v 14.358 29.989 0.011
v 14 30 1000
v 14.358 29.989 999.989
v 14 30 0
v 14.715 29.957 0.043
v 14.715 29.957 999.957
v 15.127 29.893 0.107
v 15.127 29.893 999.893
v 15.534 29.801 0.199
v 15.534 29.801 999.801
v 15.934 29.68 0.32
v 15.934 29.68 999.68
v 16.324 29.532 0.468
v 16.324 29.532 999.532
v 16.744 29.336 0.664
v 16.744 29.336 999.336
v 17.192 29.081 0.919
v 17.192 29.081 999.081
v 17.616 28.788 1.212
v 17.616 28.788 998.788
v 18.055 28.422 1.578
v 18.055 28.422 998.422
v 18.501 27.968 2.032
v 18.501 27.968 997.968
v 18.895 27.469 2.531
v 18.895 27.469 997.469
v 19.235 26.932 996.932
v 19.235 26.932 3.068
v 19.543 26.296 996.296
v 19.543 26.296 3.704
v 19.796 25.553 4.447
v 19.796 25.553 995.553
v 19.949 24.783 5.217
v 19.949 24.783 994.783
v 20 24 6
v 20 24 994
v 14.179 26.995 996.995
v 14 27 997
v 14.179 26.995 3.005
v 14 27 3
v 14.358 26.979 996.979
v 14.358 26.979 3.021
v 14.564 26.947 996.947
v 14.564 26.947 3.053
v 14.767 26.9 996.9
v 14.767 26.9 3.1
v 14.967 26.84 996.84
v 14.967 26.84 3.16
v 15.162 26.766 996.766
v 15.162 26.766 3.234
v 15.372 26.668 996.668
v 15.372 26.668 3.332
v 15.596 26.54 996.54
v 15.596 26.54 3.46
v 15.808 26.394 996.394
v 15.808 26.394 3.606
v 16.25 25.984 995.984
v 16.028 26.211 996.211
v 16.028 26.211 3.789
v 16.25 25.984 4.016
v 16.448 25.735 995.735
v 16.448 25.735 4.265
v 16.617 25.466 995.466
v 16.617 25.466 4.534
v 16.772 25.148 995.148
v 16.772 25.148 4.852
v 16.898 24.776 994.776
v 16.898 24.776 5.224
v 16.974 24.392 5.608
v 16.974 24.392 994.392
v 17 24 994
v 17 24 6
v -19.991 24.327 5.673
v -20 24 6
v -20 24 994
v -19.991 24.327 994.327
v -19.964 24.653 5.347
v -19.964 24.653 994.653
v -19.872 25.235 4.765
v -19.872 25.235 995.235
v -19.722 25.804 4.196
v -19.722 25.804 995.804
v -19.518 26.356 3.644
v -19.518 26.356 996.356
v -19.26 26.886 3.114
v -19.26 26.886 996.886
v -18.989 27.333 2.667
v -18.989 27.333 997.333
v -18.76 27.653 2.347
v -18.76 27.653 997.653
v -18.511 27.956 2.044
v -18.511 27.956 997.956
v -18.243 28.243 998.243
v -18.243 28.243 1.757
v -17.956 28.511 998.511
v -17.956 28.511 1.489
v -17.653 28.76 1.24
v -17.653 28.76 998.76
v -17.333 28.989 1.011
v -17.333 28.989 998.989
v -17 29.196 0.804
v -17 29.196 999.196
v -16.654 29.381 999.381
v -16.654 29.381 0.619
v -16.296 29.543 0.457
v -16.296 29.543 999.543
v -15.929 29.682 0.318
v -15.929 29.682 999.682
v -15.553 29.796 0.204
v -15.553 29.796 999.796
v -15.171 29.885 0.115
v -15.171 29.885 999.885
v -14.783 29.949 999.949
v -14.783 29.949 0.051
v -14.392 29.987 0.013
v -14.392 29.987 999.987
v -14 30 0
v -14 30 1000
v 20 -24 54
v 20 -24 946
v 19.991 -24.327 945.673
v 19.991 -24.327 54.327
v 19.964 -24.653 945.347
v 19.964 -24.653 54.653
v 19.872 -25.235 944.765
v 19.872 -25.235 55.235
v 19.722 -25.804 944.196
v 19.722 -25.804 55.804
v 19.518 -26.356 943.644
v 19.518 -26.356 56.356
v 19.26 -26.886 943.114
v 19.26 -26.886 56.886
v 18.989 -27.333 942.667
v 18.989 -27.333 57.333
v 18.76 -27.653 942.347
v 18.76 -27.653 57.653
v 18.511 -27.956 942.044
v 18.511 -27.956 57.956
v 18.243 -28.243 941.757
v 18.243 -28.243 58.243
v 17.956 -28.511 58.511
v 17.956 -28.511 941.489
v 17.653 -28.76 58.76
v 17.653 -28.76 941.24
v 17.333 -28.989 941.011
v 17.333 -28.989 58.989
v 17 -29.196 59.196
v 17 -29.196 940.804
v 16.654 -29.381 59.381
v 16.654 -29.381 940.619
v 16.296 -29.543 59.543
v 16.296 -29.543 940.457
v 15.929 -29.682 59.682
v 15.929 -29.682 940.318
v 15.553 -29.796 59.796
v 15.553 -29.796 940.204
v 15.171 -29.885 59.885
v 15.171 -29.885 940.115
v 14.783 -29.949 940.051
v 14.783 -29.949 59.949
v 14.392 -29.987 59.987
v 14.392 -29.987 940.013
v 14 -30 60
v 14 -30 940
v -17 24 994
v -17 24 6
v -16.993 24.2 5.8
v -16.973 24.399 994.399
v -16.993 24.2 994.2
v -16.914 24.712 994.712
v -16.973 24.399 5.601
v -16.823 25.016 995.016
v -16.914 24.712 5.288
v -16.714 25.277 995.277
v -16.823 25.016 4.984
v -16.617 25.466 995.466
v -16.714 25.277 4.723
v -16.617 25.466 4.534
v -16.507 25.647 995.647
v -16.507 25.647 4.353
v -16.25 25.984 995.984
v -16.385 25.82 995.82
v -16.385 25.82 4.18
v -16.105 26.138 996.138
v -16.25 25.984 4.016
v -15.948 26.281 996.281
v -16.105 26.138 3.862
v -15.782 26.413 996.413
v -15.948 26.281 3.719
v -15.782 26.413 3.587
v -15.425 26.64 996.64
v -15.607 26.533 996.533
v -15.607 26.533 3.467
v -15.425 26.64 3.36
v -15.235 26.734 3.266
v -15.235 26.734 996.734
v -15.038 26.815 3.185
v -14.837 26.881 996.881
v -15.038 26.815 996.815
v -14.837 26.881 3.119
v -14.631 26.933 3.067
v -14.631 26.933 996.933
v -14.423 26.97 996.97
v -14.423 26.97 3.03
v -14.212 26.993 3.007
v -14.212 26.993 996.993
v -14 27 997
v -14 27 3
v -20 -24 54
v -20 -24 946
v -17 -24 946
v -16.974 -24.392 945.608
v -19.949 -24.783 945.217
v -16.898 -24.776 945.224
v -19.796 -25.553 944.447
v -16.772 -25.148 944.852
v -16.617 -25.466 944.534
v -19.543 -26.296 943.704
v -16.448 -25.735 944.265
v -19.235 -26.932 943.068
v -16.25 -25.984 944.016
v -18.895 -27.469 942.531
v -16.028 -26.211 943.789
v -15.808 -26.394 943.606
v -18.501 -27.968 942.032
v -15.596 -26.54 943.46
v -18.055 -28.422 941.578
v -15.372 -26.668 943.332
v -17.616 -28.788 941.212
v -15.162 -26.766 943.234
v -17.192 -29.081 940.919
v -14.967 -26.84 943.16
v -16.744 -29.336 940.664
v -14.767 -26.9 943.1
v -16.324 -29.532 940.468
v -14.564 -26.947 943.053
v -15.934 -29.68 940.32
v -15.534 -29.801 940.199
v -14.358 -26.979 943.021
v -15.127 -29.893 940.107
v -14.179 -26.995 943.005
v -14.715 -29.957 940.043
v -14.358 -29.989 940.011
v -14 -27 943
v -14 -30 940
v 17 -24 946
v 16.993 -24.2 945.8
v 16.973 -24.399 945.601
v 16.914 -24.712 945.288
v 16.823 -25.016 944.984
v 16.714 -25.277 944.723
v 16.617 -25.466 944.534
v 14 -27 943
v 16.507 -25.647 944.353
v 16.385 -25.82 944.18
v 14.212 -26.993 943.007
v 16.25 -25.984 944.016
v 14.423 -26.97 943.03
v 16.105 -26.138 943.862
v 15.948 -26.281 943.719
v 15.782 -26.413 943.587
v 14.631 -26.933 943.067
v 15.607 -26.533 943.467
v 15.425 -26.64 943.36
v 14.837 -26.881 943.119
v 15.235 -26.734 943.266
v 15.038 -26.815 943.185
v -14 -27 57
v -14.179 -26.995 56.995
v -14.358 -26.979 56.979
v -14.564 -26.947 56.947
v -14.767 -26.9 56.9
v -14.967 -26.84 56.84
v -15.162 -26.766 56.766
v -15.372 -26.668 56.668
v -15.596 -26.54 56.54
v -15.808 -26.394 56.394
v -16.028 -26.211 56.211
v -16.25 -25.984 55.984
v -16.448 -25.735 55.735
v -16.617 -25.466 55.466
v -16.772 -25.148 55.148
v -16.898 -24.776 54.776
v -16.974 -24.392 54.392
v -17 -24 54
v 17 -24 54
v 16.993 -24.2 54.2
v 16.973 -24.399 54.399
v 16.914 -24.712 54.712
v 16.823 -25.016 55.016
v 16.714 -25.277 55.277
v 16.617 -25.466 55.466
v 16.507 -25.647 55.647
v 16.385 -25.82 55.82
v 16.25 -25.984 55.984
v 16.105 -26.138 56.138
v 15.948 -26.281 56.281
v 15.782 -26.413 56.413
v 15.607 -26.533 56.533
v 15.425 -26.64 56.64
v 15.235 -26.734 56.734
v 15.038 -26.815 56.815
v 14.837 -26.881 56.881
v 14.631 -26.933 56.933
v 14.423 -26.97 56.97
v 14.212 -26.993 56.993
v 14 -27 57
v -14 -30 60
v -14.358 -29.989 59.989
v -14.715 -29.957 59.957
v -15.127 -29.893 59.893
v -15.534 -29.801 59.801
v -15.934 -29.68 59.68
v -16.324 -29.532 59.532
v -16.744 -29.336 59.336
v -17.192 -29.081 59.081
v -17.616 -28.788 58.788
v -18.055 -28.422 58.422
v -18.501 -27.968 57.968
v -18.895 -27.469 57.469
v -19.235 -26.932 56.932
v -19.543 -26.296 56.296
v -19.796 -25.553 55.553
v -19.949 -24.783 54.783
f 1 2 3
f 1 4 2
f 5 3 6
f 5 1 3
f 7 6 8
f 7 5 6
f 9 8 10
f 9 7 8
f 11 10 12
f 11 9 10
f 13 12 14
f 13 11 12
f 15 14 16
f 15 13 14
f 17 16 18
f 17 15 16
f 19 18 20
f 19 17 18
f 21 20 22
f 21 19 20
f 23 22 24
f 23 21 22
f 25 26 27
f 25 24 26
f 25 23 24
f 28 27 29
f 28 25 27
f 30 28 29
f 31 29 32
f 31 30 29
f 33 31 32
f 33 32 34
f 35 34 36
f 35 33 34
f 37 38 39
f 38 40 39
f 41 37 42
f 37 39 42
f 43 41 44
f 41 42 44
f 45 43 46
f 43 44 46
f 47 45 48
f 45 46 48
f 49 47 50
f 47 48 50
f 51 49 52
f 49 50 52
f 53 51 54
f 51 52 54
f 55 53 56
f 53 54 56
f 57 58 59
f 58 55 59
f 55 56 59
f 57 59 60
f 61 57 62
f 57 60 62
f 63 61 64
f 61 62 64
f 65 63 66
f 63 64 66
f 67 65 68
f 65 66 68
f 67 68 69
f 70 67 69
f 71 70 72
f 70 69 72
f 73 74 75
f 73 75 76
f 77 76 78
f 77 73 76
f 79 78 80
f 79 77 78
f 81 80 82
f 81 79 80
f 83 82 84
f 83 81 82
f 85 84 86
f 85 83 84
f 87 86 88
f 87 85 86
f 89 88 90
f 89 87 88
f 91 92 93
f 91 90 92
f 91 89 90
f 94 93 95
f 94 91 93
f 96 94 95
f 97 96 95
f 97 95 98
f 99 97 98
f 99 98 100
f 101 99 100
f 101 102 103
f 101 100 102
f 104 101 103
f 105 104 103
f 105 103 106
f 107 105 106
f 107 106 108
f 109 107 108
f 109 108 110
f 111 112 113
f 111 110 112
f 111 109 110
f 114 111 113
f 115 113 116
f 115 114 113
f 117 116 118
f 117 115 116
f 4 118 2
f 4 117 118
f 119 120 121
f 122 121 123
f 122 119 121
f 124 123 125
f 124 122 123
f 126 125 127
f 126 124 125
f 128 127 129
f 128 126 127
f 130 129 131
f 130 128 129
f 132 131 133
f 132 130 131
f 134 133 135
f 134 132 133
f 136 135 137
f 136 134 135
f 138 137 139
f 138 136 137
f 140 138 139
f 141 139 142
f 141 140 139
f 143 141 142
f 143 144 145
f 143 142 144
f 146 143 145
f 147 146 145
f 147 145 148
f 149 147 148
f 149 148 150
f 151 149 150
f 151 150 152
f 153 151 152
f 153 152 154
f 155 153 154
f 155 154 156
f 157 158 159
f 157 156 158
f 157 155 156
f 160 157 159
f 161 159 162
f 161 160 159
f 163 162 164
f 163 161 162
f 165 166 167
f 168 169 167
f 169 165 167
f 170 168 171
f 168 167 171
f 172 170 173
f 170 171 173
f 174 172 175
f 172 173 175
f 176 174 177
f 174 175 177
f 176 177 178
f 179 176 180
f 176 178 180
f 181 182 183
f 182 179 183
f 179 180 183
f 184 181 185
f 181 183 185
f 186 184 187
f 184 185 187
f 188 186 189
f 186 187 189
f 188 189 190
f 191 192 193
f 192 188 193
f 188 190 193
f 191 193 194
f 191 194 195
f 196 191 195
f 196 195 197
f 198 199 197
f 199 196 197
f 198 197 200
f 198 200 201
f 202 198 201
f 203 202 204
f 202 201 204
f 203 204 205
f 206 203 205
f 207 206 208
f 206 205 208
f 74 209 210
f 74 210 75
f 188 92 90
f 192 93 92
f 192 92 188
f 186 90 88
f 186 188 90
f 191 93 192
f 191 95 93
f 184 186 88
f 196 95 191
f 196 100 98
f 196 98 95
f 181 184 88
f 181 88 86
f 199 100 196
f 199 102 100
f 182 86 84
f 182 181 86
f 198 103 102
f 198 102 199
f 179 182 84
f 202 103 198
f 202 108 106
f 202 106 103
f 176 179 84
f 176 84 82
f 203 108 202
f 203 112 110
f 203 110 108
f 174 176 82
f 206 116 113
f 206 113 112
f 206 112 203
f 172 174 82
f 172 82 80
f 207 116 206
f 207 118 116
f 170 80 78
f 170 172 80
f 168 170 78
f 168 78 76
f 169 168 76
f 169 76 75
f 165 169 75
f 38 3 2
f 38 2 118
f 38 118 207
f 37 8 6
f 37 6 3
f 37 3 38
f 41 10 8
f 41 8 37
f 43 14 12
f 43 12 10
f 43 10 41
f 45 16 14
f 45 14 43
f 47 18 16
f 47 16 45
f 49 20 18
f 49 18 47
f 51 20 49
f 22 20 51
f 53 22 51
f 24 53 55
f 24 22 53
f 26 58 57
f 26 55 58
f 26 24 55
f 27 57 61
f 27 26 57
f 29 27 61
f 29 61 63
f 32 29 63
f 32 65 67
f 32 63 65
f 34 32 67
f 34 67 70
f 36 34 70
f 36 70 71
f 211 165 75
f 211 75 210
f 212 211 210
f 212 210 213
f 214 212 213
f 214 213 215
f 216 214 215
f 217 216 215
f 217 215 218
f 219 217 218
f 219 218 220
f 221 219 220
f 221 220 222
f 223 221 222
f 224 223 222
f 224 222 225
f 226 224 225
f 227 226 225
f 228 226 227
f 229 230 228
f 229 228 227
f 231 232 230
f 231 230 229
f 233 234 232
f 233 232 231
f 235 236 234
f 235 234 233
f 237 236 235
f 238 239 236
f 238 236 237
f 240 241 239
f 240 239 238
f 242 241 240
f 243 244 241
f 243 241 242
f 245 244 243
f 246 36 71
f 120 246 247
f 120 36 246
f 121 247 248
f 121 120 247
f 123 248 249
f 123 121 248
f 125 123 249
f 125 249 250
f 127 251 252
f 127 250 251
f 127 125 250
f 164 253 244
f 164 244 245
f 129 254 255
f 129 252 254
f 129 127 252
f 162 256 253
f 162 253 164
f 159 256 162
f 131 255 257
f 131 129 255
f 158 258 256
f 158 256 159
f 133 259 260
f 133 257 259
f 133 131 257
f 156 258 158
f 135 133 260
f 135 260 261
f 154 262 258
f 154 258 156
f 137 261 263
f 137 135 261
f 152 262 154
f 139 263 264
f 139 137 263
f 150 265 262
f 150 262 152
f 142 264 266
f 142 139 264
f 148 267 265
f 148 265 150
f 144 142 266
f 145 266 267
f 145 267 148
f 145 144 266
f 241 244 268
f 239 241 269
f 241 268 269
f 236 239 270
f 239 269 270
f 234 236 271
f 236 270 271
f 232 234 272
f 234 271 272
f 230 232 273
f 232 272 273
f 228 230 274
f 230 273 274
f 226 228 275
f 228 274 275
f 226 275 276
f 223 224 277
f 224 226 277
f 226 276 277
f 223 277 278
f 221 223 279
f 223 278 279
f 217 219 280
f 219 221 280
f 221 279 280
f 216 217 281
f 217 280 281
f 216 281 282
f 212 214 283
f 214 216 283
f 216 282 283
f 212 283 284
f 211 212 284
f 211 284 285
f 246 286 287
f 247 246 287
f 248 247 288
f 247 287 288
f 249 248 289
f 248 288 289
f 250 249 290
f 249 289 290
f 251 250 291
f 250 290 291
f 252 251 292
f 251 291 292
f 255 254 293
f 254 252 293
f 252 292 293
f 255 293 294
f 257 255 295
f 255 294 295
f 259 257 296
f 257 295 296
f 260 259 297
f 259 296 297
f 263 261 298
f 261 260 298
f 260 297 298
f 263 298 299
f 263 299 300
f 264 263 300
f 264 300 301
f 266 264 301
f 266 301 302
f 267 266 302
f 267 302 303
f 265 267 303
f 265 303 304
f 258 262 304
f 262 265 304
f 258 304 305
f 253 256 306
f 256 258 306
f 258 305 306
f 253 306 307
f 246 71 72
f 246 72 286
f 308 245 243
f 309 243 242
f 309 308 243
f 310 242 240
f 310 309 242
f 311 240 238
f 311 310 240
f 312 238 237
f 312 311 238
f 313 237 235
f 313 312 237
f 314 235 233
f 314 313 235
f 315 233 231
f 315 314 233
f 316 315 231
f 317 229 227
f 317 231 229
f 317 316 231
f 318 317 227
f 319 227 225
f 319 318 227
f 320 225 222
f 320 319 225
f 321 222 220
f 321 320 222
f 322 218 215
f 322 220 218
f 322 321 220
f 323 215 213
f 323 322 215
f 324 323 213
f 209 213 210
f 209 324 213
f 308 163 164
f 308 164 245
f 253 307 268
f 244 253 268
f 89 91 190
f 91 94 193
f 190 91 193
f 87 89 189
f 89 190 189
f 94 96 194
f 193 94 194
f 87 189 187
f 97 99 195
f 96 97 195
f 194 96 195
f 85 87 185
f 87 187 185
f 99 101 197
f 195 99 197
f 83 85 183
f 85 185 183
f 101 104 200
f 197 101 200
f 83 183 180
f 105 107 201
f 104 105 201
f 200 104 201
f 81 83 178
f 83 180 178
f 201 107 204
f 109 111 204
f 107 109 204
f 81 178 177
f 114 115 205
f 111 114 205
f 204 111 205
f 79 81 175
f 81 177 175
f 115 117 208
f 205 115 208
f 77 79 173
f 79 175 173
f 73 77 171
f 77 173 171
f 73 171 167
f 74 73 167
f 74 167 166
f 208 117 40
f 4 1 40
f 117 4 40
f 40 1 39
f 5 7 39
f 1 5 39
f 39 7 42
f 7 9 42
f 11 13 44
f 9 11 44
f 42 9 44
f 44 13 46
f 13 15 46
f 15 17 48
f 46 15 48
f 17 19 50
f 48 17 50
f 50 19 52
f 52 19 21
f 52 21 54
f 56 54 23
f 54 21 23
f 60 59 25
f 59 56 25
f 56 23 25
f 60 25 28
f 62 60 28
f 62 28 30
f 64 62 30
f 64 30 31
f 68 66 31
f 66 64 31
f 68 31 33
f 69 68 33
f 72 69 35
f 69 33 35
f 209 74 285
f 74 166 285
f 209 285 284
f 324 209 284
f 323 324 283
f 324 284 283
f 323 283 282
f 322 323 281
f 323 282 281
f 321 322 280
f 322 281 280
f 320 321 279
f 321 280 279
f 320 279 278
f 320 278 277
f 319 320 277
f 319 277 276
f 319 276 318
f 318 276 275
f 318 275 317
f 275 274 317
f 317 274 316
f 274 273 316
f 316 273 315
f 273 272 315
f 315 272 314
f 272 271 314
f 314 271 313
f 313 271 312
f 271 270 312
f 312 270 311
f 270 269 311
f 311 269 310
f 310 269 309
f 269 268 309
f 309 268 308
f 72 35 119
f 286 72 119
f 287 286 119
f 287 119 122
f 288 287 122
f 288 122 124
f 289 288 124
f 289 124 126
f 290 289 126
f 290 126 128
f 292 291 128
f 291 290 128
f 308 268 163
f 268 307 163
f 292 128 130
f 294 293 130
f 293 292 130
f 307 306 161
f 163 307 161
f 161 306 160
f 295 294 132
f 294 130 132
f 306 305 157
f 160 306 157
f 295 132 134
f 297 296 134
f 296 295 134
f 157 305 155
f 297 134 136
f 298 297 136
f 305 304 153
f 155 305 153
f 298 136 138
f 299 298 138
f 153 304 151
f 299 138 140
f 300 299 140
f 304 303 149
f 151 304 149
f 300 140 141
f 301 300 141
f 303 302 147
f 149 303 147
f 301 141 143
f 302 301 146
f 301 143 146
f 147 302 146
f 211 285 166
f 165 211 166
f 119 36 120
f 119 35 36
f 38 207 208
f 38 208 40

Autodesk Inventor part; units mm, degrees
ref_plane "YZ Plane" through (0, 0, 0) normal (1, 0, 0) x (0, 1, 0)
ref_plane "Start plane" through (0, 0, 0) normal (0, 0, 1) x (1, 0, 0)
ref_plane "End plane" through (0, 0, 1000) normal (0, 0, 1) x (1, 0, 0)
sketch "Sketch" plane through (0, 0, 0) normal (0, 0, 1) x (1, 0, 0)
  line L0 (-20, -24) -> (-20, 24)
  line L1 (-14, 30) -> (14, 30)
  line L2 (20, 24) -> (20, -24)
  line L3 (14, -30) -> (-14, -30)
  arc A0 (-20, -24) -> (-14, -30) centre (-14, -24) ccw
  arc A1 (20, 24) -> (14, 30) centre (14, 24) ccw
  arc A2 (-14, 30) -> (-20, 24) centre (-14, 24) ccw
  arc A3 (14, -30) -> (20, -24) centre (14, -24) ccw
  arc A4 (-14, 27) -> (-17, 24) centre (-14, 24) ccw
  line L4 (-14, 27) -> (14, 27)
  arc A5 (17, 24) -> (14, 27) centre (14, 24) ccw
  line L5 (17, 24) -> (17, -24)
  arc A6 (14, -27) -> (17, -24) centre (14, -24) ccw
  line L6 (14, -27) -> (-14, -27)
  arc A7 (-17, -24) -> (-14, -27) centre (-14, -24) ccw
  line L7 (-17, -24) -> (-17, 24)
  line L8 (0, 37.1021) -> (0, -37.1021) construction
  line L9 (-23.1021, 0) -> (23.1021, 0) construction
  dimension "d7" = 6
  dimension "d9" = 40
  dimension "d11" = 60
  dimension "d12" = 3
  dimension "d15" = 20
  dimension "d16" = 30
extrude "Body" add sketch "Sketch" along normal up to surface (1000 mm away) from surface at 0
sketch "Sketch3" plane through (0, 0, 0) normal (0, 0, 1) x (1, 0, 0)
  line L0 (0, 0) -> (10, 0)
ref_plane "Work Plane3" through (0, 0, 0) normal (0, -1, 0) x (1, 0, 0)
sketch "Sketch5" plane through (20, -24, 1000) normal (1, 0, 0) x (0, 0, -1)
  line L0 (0, 0) -> (0, -6) projected
  line L1 (1000, -6) -> (0, -6) projected
  line L2 (1000, 0) -> (1000, -6) projected
  line L3 (1000, 0) -> (0, 0) projected
  line L4 (0, 48) -> (0, 0) projected
  line L5 (1000, 0) -> (0, 0) projected
  line L6 (1000, 48) -> (1000, 0) projected
  line L7 (1000, 48) -> (0, 48) projected
  line L8 (0, 54) -> (0, 48) projected
  line L9 (1000, 48) -> (0, 48) projected
  line L10 (1000, 54) -> (1000, 48) projected
  line L11 (1000, 54) -> (0, 54) projected
  line L12 (0, 54) -> (60, -6)
  line L13 (1000, 54) -> (940, -6)
  line L14 (1000, -6) -> (0, -6) projected
  point P0 (1000, 24)
  dimension "d19" = 45
  dimension "d20" = 45
extrude "Extrusion2" cut sketch "Sketch5" against normal through all contours L3 L12 L1 L0 | L4 L7 L12 L3 | L8 L12 L7 | L13 L7 L6 L3 | L3 L2 L1 L13 | L13 L10 L7
sketch "Sketch4" plane through (0, 0, 0) normal (0, -1, 0) x (1, 0, 0)
  line L0 (-2, 0) -> (12, 0) projected
  line L1 (-2, 1000) -> (12, 1000) projected
  dimension "d18" = 1000
equation "\"d7\" = G_IR"
equation "\"d9\" = G_W"
equation "\"d11\" = G_H"
equation "\"d12\" = G_T"
equation "\"d15\" = 0.5 * d9"
equation "\"d16\" = 0.5 * d11"
equation "\"d3\" = G_L"
equation "\"d20\" = d19"
equation "\"G_W\" = 40"
equation "\"G_H\" = 60"
equation "\"G_T\" = 3"
equation "\"G_IR\" = 6"
equation "\"G_L\" = d18"
equation "\"G_OFFSET_START\" = 0"
equation "\"G_OFFSET_END\" = 0"
properties part number "ISO 4019 - 60x40x3 - 1000" material "Steel, Mild"
